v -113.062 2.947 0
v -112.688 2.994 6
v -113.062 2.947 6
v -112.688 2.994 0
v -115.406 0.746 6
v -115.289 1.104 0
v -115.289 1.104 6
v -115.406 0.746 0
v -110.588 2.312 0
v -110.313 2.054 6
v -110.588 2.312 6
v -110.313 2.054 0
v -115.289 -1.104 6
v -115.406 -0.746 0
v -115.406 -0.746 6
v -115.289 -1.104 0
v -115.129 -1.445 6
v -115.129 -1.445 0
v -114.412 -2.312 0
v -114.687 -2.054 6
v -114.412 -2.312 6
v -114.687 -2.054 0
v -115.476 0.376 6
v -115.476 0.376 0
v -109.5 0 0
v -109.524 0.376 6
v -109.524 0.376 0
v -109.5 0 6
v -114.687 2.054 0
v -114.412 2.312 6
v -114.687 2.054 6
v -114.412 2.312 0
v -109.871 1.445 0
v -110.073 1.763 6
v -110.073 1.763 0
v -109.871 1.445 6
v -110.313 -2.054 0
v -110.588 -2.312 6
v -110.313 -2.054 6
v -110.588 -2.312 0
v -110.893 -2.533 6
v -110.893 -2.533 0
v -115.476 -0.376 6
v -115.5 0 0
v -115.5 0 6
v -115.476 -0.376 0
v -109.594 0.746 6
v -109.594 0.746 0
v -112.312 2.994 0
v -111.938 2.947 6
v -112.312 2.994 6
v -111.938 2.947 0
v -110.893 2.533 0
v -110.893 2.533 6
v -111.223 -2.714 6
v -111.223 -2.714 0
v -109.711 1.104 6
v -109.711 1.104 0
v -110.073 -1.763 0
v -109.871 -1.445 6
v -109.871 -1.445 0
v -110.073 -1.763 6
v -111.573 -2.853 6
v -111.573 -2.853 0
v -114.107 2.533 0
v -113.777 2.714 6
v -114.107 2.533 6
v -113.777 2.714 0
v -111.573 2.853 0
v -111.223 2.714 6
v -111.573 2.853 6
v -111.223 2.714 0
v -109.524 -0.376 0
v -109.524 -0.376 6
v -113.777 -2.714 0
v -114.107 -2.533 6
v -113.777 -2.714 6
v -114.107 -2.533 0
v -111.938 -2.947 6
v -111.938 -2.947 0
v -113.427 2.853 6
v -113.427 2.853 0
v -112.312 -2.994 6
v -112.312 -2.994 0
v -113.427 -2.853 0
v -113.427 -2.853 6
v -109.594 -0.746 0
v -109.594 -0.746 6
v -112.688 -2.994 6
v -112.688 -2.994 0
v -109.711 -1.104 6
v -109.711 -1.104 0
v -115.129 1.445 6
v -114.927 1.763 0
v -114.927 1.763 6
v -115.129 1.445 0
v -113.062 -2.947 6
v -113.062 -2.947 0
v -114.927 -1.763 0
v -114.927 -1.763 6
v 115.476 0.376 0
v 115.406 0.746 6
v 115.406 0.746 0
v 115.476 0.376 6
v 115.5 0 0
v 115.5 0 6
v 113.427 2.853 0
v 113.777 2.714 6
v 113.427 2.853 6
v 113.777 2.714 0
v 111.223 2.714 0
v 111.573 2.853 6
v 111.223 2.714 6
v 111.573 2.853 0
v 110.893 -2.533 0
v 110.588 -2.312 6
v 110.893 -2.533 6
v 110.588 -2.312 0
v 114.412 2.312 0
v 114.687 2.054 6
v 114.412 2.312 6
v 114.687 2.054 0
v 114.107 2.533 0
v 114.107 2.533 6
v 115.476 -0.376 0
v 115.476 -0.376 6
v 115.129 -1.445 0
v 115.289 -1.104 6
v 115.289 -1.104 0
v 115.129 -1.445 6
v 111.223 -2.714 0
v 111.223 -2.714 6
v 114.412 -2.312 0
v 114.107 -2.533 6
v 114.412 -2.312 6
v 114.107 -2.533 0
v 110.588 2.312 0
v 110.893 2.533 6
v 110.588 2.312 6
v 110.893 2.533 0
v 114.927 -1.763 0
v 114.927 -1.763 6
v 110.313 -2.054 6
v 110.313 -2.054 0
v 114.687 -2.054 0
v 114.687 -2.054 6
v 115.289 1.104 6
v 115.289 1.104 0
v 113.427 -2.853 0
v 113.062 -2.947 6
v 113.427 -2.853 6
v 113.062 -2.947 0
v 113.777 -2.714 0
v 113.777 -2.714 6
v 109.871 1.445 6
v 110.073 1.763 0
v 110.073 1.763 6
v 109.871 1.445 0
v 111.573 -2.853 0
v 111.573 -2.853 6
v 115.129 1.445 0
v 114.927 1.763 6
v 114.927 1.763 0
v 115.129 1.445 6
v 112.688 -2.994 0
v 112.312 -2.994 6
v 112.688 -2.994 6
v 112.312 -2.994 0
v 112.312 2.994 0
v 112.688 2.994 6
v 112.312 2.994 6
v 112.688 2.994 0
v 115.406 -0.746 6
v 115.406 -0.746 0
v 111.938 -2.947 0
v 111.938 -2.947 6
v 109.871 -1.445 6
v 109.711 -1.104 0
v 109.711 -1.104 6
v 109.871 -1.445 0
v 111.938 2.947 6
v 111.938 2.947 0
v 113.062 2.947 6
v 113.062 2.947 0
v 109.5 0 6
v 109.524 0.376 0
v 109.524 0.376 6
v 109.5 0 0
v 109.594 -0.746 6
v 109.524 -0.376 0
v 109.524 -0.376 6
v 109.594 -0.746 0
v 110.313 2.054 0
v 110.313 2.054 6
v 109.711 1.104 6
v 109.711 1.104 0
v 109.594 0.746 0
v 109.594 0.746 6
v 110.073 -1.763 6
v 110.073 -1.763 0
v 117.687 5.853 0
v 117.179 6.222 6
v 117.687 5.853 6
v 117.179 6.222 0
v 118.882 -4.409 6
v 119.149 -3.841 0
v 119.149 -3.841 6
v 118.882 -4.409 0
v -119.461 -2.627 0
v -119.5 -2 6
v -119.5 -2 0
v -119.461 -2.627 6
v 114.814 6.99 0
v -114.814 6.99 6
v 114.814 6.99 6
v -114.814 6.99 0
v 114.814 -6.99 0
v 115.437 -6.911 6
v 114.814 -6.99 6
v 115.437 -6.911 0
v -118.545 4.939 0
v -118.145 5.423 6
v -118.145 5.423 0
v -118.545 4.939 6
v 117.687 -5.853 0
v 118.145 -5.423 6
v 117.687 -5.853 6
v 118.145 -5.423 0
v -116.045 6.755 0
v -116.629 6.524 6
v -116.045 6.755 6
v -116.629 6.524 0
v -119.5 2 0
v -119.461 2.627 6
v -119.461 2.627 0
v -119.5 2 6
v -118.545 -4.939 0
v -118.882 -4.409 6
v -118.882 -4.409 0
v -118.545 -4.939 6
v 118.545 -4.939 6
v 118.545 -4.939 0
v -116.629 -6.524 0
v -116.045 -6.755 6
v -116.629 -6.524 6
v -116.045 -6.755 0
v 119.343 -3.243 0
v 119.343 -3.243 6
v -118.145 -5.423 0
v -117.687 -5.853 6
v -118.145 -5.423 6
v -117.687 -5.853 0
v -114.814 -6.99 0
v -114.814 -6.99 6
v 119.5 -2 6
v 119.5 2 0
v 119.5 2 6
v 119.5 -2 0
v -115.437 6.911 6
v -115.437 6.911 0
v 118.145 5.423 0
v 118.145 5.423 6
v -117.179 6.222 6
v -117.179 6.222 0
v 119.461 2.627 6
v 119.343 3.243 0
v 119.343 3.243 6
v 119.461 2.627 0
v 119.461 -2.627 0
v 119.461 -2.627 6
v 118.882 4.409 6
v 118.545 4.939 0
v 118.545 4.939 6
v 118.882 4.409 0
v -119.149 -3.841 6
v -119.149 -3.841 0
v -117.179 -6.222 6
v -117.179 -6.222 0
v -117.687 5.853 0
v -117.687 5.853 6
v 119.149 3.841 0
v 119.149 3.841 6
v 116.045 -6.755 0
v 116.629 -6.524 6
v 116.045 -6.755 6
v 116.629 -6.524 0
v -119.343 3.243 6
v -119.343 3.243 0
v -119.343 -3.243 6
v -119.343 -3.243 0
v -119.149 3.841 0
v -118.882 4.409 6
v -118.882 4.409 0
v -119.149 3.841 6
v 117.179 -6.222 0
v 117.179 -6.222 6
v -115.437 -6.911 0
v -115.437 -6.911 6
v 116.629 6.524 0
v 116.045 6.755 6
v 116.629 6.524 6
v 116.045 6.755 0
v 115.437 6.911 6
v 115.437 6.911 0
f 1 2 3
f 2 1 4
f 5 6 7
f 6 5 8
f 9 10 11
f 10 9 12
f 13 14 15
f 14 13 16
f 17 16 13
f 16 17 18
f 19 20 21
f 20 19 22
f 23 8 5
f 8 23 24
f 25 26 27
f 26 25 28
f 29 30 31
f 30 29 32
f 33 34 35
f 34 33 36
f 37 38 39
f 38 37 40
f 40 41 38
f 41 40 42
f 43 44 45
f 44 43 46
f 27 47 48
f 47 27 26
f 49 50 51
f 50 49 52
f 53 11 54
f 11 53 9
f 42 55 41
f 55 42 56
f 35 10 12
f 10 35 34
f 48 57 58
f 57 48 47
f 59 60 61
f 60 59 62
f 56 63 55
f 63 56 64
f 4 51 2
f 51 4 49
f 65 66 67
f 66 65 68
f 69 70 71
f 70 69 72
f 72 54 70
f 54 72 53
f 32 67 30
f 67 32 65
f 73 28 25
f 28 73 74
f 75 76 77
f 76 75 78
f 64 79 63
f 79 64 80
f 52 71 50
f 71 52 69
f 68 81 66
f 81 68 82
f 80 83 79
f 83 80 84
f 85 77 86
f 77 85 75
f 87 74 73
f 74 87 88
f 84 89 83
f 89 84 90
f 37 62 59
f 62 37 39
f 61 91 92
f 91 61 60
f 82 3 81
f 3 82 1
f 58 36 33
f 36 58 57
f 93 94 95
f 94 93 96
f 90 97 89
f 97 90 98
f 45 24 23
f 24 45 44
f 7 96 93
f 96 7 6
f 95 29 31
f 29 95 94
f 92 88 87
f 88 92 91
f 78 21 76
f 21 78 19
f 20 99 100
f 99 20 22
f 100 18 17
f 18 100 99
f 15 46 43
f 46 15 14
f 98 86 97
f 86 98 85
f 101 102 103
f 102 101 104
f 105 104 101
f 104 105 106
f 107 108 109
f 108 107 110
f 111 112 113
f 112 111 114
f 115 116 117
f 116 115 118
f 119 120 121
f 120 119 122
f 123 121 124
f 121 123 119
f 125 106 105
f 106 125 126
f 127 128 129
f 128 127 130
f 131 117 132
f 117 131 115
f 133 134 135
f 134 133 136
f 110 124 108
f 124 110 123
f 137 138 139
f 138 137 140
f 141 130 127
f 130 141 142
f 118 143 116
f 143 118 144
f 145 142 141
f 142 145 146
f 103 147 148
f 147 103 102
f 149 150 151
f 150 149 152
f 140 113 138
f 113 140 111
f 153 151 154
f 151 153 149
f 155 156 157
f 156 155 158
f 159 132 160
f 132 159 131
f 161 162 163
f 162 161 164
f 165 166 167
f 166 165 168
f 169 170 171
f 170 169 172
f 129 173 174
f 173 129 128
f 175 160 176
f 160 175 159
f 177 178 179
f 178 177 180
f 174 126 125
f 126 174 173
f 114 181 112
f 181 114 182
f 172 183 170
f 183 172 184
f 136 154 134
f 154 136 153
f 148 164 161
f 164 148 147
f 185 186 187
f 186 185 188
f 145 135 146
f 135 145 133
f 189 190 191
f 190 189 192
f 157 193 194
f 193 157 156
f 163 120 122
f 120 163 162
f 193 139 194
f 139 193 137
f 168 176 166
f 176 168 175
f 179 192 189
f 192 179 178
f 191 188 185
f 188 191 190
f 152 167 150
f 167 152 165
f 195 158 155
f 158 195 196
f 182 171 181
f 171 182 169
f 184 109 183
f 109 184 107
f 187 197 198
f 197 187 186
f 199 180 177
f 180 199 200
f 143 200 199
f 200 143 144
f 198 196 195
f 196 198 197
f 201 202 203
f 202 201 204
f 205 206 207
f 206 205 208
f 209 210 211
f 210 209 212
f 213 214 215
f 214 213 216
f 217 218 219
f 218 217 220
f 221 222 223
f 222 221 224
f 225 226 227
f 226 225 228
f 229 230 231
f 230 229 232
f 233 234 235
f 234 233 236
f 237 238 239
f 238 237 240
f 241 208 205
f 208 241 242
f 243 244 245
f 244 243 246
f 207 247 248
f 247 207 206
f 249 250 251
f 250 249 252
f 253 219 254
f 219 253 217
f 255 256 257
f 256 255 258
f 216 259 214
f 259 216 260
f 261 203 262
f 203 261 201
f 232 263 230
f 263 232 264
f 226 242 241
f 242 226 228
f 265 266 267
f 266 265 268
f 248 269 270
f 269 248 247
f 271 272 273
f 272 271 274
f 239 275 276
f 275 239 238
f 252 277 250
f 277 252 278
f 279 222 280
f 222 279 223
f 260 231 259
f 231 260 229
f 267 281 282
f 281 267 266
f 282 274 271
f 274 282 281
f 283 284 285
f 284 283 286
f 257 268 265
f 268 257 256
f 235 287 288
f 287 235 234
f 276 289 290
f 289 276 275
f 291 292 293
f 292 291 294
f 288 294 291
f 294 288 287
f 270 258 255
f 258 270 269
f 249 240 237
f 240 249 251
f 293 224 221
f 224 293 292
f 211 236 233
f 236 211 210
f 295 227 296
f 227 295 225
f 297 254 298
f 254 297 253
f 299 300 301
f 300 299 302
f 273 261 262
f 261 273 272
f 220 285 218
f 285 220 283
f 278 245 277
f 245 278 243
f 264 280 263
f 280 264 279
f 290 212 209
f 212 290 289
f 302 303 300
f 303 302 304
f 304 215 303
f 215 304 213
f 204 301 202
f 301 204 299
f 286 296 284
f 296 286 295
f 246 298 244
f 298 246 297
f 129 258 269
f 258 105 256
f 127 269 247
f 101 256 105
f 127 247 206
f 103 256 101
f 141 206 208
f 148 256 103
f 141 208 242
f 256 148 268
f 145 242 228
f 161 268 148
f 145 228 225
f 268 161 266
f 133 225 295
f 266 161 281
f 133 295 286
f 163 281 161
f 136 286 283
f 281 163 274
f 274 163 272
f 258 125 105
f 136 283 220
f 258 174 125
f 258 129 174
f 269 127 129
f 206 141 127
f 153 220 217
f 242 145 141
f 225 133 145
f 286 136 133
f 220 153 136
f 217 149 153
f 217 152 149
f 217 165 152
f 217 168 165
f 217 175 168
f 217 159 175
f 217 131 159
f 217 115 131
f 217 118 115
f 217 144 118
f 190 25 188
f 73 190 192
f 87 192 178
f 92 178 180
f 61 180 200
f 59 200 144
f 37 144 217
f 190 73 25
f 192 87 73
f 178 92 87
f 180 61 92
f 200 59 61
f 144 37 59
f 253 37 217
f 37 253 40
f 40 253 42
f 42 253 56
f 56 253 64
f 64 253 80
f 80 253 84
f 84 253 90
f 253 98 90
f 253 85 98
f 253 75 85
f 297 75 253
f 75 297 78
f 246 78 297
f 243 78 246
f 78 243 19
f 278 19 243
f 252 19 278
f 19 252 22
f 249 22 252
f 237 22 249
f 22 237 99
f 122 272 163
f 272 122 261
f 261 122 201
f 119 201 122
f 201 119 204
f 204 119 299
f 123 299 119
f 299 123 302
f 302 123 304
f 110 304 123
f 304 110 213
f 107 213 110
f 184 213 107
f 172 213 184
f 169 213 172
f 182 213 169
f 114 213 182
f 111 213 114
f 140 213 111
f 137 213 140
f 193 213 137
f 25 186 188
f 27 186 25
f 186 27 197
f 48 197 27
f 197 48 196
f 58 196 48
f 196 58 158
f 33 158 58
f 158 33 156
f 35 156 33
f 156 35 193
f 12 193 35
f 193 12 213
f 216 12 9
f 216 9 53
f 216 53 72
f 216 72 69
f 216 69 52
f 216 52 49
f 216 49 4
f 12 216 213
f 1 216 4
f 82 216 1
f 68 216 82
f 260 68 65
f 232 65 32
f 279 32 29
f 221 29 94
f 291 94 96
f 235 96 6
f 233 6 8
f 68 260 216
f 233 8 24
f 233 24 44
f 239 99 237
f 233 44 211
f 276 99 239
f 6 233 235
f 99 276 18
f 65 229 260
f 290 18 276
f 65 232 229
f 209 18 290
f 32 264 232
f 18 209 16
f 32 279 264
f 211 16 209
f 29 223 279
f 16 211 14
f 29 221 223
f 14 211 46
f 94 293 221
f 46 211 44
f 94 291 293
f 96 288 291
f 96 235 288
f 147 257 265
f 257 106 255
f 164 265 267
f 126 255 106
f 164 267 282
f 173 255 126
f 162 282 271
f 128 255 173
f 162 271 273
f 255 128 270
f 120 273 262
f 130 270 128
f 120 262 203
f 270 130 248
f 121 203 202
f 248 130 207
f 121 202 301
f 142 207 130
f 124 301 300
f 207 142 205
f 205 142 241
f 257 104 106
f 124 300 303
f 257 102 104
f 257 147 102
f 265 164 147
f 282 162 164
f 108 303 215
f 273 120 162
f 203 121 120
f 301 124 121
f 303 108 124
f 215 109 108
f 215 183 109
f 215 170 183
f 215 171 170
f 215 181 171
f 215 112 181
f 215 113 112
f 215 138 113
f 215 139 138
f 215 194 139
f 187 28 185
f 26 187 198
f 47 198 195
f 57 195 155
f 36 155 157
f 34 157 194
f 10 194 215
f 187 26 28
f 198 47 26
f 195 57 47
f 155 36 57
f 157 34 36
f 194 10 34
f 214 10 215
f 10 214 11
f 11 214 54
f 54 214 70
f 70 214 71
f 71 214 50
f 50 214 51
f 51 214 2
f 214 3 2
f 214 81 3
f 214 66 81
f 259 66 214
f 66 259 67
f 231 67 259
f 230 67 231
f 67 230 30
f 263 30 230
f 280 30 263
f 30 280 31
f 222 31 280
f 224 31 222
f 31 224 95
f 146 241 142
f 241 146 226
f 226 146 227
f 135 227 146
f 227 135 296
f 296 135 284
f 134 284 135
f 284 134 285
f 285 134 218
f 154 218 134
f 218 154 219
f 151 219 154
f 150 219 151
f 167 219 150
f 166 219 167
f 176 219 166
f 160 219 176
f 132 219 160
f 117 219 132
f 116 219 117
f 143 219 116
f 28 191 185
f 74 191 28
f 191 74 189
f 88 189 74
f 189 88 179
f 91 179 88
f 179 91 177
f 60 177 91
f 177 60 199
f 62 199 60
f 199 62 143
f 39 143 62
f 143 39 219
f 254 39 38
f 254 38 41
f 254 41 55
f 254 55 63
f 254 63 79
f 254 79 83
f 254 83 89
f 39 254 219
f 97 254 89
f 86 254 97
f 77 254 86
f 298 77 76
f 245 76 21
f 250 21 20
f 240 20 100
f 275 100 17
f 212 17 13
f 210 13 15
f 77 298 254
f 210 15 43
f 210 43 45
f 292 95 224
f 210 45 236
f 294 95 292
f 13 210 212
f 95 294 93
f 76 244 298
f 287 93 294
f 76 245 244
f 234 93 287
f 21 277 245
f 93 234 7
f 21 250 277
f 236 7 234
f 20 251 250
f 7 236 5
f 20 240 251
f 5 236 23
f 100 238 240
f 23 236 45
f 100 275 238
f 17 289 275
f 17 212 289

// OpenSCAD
$fn = 50;


difference() {
	union() {
		hull() {
			translate(v = [-114.5000000000, 2.0000000000, 0]) {
				cylinder(h = 6, r = 5);
			}
			translate(v = [114.5000000000, 2.0000000000, 0]) {
				cylinder(h = 6, r = 5);
			}
			translate(v = [-114.5000000000, -2.0000000000, 0]) {
				cylinder(h = 6, r = 5);
			}
			translate(v = [114.5000000000, -2.0000000000, 0]) {
				cylinder(h = 6, r = 5);
			}
		}
	}
	union() {
		translate(v = [-112.5000000000, 0.0000000000, -100.0000000000]) {
			cylinder(h = 200, r = 3.0000000000);
		}
		translate(v = [-112.5000000000, 0.0000000000, -100.0000000000]) {
			cylinder(h = 200, r = 3.0000000000);
		}
		translate(v = [112.5000000000, 0.0000000000, -100.0000000000]) {
			cylinder(h = 200, r = 3.0000000000);
		}
		translate(v = [112.5000000000, 0.0000000000, -100.0000000000]) {
			cylinder(h = 200, r = 3.0000000000);
		}
	}
}
